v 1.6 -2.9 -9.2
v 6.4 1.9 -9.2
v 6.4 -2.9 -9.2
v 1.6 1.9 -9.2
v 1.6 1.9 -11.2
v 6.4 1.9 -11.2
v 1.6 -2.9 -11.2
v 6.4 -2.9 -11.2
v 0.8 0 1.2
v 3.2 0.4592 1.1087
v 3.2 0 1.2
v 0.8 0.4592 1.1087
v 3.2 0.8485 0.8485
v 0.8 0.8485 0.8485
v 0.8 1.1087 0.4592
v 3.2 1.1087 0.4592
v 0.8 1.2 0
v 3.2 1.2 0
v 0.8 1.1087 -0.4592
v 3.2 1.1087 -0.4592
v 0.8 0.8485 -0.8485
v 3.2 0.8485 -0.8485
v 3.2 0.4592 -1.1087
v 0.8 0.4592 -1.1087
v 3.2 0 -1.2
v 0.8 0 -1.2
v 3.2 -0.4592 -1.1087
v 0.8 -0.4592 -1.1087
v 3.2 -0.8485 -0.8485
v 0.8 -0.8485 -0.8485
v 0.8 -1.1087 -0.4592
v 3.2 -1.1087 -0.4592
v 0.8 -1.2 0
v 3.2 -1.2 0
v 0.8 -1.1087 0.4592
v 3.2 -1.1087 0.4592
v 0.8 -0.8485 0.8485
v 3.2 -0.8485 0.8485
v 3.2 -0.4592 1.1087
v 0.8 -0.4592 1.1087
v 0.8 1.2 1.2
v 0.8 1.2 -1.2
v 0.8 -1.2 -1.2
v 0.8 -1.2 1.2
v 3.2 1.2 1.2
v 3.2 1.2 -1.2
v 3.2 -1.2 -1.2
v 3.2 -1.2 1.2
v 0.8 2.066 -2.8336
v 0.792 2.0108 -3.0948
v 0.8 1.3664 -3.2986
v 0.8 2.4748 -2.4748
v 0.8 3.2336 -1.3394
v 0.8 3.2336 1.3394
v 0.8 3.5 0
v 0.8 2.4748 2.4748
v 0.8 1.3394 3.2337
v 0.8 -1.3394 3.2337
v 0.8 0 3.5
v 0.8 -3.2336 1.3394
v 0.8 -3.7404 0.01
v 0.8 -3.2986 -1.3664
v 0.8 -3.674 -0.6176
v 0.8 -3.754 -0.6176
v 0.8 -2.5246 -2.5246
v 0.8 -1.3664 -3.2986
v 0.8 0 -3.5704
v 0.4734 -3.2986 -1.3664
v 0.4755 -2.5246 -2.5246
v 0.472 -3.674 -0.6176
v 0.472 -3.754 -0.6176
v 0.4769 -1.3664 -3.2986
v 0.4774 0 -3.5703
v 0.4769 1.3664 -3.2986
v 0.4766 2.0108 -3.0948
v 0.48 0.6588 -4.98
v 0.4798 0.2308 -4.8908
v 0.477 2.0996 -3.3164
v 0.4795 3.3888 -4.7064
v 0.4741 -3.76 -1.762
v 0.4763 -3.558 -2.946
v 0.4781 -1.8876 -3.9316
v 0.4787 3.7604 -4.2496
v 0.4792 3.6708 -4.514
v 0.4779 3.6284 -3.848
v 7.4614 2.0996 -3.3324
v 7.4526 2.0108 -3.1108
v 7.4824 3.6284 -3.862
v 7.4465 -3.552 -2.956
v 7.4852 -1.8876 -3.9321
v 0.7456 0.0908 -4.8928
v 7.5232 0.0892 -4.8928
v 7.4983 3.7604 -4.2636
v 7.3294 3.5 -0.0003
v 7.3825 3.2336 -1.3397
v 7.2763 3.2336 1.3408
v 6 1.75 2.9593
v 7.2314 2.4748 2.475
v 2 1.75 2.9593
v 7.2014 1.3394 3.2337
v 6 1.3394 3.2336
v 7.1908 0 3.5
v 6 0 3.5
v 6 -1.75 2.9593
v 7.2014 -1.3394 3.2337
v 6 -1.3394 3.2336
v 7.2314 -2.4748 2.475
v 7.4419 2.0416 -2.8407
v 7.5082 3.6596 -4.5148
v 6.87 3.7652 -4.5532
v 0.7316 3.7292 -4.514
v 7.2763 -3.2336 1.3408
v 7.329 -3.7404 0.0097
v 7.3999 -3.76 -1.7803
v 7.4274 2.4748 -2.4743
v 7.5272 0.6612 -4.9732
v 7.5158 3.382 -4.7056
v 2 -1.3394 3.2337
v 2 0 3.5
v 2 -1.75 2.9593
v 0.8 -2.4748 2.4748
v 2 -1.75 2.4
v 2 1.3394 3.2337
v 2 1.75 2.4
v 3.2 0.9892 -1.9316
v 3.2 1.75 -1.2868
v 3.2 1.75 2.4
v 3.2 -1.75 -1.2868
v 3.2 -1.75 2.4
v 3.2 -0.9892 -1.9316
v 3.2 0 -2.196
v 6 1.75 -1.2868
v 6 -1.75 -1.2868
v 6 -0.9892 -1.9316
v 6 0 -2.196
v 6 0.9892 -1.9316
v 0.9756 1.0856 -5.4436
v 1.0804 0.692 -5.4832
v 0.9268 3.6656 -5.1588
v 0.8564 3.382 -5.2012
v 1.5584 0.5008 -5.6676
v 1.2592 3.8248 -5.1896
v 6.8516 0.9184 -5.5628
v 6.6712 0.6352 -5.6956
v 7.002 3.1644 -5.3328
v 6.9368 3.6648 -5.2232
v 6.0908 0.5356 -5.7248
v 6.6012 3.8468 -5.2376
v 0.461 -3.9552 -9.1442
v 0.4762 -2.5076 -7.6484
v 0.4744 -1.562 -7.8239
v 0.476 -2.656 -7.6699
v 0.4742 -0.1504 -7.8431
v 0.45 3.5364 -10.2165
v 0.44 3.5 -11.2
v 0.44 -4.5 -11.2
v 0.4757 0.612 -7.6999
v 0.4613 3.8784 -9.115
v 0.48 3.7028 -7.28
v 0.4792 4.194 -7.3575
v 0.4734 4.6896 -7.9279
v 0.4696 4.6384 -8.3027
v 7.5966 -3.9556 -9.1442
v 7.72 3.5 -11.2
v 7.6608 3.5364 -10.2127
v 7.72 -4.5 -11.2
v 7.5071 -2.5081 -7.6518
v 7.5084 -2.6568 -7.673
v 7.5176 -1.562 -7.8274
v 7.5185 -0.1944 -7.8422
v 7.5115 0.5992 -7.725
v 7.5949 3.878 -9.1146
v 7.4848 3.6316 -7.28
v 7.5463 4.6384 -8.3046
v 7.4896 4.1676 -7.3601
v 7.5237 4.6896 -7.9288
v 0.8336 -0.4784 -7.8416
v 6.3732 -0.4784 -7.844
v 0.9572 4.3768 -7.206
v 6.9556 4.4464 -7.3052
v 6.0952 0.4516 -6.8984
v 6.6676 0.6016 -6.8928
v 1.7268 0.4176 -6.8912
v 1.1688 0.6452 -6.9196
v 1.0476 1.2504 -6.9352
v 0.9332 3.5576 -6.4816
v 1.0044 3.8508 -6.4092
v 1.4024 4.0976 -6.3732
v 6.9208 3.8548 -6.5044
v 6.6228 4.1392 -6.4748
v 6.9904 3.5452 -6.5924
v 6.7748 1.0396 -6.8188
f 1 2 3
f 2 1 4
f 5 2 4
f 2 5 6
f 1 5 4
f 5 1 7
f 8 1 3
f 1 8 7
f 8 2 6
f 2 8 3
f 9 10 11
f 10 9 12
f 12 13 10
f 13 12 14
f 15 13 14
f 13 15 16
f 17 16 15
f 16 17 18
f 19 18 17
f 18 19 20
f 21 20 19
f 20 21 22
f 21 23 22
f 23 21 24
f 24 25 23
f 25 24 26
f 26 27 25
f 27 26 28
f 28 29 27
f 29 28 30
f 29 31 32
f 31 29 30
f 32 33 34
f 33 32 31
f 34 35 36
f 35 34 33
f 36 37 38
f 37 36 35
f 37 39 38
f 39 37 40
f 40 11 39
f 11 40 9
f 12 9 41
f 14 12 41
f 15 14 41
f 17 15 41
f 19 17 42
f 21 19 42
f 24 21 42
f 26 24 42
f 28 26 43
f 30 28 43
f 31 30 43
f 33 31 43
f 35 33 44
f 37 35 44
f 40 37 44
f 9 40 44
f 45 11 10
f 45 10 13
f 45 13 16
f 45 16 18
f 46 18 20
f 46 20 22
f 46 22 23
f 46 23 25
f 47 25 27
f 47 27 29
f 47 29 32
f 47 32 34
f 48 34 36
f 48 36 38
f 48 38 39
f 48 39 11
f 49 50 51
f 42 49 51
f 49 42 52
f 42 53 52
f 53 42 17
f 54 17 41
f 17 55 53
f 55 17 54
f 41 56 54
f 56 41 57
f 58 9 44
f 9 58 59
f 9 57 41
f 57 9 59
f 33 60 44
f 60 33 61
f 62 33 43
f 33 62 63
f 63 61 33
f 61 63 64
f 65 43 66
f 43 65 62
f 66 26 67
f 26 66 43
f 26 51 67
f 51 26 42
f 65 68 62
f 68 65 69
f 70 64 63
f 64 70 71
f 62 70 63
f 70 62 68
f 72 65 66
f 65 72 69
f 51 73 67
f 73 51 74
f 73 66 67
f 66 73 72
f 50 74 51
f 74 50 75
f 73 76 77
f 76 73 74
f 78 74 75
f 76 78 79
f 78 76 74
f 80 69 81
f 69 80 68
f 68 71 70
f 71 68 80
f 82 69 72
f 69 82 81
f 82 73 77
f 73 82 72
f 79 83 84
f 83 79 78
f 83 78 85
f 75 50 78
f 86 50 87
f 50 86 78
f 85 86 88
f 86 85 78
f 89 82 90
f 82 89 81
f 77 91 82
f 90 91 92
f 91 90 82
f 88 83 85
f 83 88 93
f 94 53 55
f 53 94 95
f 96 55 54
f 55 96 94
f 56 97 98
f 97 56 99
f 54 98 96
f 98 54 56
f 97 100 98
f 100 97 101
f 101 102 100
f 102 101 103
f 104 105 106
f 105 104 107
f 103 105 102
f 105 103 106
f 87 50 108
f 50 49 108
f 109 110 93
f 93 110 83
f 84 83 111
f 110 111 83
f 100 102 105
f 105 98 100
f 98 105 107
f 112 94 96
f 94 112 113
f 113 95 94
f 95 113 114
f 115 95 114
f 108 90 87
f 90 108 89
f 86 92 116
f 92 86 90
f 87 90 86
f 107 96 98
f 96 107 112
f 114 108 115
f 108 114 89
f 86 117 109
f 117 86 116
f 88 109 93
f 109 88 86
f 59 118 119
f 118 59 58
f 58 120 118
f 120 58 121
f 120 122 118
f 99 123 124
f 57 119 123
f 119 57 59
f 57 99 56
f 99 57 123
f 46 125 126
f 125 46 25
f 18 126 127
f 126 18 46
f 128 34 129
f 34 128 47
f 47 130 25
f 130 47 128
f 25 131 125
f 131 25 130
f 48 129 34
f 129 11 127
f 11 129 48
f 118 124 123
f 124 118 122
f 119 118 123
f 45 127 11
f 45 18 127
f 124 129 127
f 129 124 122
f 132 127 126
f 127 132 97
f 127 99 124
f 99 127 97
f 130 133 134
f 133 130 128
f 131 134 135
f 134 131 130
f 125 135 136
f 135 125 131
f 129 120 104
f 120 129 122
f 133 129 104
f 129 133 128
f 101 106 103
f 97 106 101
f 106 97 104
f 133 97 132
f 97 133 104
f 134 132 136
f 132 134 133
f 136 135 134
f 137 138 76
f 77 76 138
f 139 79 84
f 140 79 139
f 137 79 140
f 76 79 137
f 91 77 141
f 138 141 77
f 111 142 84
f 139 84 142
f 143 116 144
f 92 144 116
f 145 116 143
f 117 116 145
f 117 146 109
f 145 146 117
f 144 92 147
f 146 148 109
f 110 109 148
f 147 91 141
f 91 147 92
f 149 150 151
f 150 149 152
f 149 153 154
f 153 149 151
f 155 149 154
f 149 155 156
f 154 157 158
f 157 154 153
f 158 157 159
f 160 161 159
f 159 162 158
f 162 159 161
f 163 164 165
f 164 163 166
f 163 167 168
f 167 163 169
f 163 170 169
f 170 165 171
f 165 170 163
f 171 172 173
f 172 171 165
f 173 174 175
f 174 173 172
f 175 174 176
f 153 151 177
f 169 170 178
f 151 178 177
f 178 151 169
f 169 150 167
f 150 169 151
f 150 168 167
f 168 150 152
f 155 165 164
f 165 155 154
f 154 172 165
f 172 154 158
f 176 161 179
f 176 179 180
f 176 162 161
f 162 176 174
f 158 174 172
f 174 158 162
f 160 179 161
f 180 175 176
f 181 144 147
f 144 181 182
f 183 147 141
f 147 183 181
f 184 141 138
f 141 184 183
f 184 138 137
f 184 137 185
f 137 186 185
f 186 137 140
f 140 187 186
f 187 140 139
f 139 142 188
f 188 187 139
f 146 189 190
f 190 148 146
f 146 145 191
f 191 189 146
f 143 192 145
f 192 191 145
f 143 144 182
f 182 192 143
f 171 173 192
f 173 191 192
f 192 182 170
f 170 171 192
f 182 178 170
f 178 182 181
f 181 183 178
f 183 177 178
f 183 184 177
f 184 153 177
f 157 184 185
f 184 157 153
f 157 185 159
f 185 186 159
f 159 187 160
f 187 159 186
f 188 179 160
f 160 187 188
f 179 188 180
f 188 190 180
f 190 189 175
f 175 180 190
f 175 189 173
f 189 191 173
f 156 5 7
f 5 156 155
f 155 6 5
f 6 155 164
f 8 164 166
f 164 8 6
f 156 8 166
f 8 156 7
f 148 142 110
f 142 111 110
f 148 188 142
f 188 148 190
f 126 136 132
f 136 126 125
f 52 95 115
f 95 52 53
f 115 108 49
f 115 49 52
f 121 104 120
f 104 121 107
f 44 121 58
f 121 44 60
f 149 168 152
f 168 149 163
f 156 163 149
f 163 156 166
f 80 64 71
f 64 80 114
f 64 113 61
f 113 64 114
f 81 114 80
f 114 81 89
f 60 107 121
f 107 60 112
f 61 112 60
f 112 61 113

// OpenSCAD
use <../lib.scad>
use <s/24083s01.scad>
function ldraw_lib__24083() = [
// 0 Minifig Leg Faun Left
// 0 Name: 24083.dat
// 0 Author: Magnus Forsberg [MagFors]
// 0 !LDRAW_ORG Part UPDATE 2023-02
// 0 !LICENSE Licensed under CC BY 4.0 : see CAreadme.txt
// 
// 0 !HELP Move down 12 units to align with hips
// 
// 0 BFC CERTIFY CCW
  [0,"BFC","CERTIFY"],
  [0,"BFC","CCW"],
// 
// 0 !HISTORY 2016-03-18 {LEGO Digital Designer} Original part shape
// 0 !HISTORY 2019-06-05 [MagFors] File preparation for LDraw Parts Tracker
// 0 !HISTORY 2023-01-30 [MagFors] Repositioned the hoof
// 0 !HISTORY 2023-04-17 [OrionP] Official Update 2023-02
// 
// 
// 1 16 0 0 0 1 0 0 0 1 0 0 0 1 s\24083s01.dat
  [1,16,0,0,0,1,0,0,0,1,0,0,0,1, ldraw_lib__s__24083s01()],
// 0 // hoof
// 4 16 18.9916 22.8606 -9.889 18.771 19.1826 -6.642 1.1901 19.1747 -6.6401 1.1524 22.8605 -9.8881
  [4,16,18.9916,22.8606,-9.889,18.771,19.1826,-6.642,1.1901,19.1747,-6.6401,1.1524,22.8605,-9.8881],
// 4 16 19.3 28 -11.25 18.9916 22.8606 -9.889 1.1524 22.8605 -9.8881 1.1 28 -11.25
  [4,16,19.3,28,-11.25,18.9916,22.8606,-9.889,1.1524,22.8605,-9.8881,1.1,28,-11.25],
// 0 // leg
// 4 16 18.4998 4.4507 -9.4 2 1.544 -9.385 1.18 1.544 -9.385 1.1852 4.4049 -9.4
  [4,16,18.4998,4.4507,-9.4,2,1.544,-9.385,1.18,1.544,-9.385,1.1852,4.4049,-9.4],
// 4 16 2 -.025 -9.351 2 1.544 -9.385 18.4998 4.4507 -9.4 18.3226 -.0243 -9.351
  [4,16,2,-.025,-9.351,2,1.544,-9.385,18.4998,4.4507,-9.4,18.3226,-.0243,-9.351],
// 4 16 18.6162 7.3899 -8.88 18.4998 4.4507 -9.4 1.1852 4.4049 -9.4 1.1907 7.3649 -8.895
  [4,16,18.6162,7.3899,-8.88,18.4998,4.4507,-9.4,1.1852,4.4049,-9.4,1.1907,7.3649,-8.895],
// 4 16 2 -6.1871 -6.1871 2 -3.3486 -8.0841 18.1908 -3.3519 -8.0841 18.0785 -6.1876 -6.1871
  [4,16,2,-6.1871,-6.1871,2,-3.3486,-8.0841,18.1908,-3.3519,-8.0841,18.0785,-6.1876,-6.1871],
// 4 16 2 -3.3486 -8.0841 2 -.025 -9.351 18.3226 -.0243 -9.351 18.1908 -3.3519 -8.0841
  [4,16,2,-3.3486,-8.0841,2,-.025,-9.351,18.3226,-.0243,-9.351,18.1908,-3.3519,-8.0841],
];
module ldraw_lib__24083(step=0, col=false, unit=2/5, alt=false, line=0.2, solid=!$preview)
    makepoly(ldraw_lib__24083(), step=step, col=col, unit=unit, alt=alt, line=line, solid=solid);
ldraw_lib__24083(line=0.2);
